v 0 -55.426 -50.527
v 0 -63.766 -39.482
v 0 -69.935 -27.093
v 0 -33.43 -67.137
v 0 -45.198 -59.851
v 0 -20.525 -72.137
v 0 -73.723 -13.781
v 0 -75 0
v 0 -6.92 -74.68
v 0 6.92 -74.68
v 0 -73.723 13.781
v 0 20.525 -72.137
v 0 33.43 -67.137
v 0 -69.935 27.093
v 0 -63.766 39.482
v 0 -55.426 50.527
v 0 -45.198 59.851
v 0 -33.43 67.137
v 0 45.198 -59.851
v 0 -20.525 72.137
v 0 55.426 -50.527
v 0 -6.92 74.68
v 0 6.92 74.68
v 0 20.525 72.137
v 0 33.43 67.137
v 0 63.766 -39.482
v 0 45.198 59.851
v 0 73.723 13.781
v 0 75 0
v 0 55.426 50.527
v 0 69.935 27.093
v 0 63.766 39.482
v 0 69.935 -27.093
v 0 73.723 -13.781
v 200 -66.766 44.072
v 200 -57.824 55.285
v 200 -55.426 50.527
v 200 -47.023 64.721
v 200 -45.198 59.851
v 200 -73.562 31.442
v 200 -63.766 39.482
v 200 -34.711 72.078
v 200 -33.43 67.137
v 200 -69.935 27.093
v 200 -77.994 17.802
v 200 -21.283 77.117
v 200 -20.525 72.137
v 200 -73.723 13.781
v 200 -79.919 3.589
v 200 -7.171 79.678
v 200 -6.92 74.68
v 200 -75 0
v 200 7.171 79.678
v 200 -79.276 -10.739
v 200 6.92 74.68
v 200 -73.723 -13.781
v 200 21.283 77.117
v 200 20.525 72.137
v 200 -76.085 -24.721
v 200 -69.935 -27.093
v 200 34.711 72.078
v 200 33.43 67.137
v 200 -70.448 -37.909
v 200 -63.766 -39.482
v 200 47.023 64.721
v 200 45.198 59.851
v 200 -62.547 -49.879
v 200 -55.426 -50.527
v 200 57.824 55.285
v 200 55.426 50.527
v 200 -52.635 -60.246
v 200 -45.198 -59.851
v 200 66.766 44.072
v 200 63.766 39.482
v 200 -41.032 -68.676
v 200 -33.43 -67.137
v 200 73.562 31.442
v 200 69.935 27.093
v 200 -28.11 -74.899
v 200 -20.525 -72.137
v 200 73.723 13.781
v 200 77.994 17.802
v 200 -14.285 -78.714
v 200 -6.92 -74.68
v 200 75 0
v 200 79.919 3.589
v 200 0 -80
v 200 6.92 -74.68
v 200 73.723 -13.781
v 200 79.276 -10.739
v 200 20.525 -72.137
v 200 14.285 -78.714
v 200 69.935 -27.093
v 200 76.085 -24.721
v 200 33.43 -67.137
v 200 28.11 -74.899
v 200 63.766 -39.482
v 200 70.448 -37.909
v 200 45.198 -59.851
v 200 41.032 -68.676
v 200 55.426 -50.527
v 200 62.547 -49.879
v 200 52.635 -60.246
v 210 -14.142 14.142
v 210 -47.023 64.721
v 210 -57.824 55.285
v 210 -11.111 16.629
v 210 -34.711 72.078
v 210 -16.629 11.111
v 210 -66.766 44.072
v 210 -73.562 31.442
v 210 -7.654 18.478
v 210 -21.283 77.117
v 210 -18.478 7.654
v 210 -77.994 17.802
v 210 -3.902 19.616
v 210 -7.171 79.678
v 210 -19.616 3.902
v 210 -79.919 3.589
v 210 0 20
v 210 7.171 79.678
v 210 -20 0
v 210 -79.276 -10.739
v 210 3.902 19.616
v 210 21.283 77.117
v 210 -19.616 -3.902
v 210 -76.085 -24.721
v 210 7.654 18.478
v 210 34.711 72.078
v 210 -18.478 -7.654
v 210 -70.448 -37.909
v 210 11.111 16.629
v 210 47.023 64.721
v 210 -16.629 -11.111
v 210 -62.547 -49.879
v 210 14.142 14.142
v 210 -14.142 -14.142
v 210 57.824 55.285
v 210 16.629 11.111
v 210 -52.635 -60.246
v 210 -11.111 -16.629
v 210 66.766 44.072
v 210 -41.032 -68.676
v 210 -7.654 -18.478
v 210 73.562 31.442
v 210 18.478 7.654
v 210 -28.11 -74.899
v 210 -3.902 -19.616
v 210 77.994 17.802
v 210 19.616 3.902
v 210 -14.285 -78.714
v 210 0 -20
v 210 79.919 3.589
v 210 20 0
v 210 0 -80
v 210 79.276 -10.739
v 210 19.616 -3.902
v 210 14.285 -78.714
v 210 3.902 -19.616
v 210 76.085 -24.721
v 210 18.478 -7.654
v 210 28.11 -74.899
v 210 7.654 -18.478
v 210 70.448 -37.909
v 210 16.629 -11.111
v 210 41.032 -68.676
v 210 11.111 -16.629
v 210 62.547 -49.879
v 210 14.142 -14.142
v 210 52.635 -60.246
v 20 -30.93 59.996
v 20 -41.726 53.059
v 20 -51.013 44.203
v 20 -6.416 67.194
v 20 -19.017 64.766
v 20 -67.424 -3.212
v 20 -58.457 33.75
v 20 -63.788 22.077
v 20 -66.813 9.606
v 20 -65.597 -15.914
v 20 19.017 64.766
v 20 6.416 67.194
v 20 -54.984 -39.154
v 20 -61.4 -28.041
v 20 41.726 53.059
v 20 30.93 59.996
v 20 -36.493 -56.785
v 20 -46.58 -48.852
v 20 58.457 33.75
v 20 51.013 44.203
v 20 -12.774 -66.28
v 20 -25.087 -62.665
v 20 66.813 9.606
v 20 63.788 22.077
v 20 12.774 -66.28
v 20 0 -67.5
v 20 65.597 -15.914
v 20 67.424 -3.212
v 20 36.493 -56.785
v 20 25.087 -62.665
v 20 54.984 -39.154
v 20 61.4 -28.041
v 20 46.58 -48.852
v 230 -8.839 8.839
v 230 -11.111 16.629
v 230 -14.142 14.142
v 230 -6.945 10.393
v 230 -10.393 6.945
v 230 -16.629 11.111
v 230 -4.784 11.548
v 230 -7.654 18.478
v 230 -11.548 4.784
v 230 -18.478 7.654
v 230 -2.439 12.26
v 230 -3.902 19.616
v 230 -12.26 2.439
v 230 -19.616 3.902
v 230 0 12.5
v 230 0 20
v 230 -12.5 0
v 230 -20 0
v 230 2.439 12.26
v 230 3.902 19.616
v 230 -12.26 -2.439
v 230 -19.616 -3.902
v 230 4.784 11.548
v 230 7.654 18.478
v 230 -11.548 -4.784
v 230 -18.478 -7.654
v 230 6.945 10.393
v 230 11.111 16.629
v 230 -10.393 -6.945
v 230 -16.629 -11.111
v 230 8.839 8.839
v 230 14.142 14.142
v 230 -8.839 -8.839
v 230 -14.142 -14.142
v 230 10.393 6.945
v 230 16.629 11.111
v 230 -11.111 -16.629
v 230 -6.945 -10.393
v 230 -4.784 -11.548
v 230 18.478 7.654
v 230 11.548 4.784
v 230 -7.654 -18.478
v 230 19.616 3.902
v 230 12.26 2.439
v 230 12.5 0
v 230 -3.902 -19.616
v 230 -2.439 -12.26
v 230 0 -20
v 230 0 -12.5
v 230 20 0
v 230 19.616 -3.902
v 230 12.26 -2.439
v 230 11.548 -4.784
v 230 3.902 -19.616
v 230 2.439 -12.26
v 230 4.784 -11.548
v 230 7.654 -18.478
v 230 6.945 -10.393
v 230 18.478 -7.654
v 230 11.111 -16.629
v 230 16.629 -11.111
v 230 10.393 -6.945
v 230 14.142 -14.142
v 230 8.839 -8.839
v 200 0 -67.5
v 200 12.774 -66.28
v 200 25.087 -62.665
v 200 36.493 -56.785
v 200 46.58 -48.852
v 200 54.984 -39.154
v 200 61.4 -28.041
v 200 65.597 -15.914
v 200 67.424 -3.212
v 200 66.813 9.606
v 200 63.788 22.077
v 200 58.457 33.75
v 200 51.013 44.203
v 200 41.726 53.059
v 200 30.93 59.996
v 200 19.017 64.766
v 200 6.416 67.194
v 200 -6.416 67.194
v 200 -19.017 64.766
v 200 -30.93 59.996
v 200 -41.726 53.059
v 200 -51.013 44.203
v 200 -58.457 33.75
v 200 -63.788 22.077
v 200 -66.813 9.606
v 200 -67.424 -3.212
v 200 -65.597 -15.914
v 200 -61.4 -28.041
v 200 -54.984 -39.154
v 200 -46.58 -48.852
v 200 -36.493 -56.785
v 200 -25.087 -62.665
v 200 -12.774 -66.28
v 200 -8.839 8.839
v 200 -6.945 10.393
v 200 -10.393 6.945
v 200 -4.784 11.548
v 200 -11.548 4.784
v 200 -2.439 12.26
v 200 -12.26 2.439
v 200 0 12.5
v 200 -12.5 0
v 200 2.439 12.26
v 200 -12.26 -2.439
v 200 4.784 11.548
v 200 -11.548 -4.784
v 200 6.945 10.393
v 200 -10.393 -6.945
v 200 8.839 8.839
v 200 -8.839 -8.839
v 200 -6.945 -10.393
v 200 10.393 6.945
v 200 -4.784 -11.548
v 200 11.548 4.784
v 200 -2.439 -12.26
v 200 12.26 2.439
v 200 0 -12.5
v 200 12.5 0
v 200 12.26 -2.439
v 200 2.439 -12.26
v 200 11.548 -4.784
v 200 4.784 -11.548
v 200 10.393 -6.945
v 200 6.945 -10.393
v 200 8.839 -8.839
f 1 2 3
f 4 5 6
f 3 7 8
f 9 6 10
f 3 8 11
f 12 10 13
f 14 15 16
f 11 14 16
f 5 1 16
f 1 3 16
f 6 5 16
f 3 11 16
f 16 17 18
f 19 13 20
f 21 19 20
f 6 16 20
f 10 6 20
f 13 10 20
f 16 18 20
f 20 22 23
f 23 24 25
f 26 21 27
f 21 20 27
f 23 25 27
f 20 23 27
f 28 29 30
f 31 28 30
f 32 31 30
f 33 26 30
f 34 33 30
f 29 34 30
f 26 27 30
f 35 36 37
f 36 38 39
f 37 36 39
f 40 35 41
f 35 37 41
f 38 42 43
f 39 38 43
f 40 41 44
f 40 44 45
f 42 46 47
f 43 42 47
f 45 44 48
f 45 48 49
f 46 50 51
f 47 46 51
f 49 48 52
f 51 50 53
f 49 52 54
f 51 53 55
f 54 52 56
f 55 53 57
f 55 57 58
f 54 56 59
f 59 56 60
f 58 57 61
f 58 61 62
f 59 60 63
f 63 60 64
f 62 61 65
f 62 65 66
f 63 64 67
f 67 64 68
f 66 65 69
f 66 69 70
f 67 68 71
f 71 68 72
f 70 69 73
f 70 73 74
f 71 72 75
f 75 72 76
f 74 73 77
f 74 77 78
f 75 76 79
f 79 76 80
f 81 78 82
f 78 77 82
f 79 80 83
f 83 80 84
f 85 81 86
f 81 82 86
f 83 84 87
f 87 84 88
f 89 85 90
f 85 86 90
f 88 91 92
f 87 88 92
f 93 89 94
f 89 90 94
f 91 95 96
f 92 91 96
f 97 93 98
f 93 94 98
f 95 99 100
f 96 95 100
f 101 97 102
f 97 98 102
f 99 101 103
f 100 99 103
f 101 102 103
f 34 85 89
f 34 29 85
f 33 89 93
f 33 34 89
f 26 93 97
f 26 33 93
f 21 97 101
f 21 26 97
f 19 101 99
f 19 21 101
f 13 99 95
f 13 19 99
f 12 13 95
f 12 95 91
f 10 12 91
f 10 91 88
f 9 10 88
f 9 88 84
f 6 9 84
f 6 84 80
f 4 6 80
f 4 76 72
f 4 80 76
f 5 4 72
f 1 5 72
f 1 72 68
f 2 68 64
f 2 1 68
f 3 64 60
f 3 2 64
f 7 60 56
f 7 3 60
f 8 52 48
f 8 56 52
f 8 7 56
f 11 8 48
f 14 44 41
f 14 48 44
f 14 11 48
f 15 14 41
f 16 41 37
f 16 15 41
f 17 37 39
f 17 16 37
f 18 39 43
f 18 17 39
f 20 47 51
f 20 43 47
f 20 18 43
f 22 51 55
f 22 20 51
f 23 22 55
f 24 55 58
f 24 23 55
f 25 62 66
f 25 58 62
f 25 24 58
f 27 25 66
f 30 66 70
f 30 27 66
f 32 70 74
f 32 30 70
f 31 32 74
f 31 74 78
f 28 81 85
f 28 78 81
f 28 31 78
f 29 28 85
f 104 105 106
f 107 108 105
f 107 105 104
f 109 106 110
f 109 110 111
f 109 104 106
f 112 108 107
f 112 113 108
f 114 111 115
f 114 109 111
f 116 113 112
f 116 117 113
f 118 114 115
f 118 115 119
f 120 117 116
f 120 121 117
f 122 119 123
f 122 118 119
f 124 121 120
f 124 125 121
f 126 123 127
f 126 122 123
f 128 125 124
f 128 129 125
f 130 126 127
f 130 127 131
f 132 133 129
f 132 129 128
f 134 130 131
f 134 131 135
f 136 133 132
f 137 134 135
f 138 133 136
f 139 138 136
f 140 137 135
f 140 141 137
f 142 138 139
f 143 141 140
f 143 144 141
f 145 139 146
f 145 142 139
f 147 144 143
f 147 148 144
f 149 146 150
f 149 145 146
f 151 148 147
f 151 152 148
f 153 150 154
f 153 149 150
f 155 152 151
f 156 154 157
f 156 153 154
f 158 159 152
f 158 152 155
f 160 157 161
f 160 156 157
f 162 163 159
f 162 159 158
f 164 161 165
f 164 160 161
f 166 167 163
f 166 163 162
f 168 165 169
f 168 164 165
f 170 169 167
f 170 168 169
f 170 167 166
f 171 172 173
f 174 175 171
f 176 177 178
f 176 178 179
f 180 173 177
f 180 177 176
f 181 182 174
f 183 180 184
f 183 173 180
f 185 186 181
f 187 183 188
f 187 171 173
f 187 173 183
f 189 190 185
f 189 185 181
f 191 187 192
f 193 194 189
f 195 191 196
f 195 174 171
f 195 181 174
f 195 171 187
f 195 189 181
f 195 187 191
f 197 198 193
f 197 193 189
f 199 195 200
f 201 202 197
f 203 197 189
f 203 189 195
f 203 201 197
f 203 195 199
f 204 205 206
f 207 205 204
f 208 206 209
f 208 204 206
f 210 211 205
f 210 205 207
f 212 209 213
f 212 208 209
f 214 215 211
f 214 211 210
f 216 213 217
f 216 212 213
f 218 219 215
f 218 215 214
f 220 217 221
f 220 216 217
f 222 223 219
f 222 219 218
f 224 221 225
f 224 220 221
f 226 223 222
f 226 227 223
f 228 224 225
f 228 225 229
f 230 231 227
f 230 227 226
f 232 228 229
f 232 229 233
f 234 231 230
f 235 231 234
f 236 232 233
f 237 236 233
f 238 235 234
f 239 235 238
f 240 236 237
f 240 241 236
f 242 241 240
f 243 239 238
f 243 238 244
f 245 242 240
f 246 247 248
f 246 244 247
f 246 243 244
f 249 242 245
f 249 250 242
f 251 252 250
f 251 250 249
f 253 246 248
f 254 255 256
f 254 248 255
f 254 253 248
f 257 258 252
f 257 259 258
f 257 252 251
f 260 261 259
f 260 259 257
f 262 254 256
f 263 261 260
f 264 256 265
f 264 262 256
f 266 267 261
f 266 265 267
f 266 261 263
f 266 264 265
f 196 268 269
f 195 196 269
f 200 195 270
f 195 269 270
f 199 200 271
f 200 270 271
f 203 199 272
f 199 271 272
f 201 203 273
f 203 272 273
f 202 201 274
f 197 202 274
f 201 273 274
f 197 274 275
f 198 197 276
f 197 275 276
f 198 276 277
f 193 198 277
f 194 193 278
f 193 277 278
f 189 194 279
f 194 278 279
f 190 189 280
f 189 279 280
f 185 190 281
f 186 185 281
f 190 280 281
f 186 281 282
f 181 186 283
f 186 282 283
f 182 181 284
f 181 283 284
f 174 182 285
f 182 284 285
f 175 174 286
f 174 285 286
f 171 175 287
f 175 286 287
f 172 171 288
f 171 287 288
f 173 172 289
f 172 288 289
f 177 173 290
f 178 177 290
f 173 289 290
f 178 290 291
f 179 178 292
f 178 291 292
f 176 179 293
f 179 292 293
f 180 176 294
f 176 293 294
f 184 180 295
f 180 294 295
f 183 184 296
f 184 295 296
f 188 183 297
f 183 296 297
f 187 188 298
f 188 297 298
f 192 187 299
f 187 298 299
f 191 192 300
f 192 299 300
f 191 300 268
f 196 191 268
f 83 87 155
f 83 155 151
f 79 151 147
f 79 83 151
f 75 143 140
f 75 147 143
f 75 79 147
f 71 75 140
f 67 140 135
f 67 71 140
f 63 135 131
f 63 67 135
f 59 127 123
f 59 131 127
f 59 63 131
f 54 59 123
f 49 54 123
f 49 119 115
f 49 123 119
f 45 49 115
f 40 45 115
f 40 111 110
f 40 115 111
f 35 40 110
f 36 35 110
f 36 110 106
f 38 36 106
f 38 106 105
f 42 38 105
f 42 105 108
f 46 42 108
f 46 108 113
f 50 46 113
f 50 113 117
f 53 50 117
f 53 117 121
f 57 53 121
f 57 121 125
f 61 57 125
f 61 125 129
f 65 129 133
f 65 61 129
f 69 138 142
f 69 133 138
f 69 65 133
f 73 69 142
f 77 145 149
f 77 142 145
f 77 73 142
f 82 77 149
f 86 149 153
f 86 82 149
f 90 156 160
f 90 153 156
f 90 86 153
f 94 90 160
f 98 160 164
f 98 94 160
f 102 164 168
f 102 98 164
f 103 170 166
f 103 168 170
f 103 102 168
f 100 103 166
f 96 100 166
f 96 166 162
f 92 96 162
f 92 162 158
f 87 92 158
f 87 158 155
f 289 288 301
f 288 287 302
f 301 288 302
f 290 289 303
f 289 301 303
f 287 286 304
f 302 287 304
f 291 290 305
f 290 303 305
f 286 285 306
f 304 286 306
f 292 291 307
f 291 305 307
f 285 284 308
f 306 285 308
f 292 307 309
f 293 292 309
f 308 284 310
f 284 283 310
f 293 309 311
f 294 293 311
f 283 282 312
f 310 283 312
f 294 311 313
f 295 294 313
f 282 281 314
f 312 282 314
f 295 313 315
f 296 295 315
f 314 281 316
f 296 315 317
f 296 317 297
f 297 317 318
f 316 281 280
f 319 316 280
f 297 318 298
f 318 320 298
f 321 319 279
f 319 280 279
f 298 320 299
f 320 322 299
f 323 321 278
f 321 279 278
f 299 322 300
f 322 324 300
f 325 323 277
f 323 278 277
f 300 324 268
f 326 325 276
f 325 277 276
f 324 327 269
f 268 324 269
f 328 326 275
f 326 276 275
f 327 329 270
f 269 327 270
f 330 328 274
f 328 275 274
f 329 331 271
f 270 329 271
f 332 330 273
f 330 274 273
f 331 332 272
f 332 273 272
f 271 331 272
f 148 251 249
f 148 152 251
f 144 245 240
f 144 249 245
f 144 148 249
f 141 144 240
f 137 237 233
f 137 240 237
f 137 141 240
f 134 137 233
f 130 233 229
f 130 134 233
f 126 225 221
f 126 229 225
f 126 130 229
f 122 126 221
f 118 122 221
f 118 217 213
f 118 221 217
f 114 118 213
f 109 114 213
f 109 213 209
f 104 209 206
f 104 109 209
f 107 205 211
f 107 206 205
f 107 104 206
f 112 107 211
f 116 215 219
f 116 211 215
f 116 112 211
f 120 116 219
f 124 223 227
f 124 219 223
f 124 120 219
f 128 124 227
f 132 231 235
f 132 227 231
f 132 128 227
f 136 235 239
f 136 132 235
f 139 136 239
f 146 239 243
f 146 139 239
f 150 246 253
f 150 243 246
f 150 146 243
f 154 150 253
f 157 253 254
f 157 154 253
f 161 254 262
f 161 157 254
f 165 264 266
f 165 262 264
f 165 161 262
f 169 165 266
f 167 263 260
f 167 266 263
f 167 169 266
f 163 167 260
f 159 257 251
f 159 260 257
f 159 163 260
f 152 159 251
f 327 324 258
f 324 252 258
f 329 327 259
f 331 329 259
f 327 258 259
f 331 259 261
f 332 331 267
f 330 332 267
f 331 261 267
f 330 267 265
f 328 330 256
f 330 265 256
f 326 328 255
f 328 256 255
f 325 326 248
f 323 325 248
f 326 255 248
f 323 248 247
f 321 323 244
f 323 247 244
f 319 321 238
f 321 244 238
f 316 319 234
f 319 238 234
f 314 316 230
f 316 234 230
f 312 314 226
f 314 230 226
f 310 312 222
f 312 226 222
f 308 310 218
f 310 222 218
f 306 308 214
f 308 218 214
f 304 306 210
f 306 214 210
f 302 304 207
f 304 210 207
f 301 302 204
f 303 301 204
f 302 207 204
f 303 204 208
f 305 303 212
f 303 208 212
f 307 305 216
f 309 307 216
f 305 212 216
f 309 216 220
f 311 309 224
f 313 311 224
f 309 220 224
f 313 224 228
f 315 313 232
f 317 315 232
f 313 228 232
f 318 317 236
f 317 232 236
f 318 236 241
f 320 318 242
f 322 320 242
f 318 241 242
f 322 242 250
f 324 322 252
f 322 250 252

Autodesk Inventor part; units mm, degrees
ref_plane "YZ Plane" through (0, 0, 0) normal (1, 0, 0) x (0, 1, 0)
ref_plane "XZ Plane" through (0, 0, 0) normal (0, 1, 0) x (-1, 0, 0)
ref_plane "XY Plane" through (0, 0, 0) normal (0, 0, 1) x (1, 0, 0)
sketch "Sketch1" plane through (0, 0, 0) normal (1, 0, 0) x (0, 1, 0)
  circle A0 centre (0, 0) radius 75
  dimension "d0" = 150
extrude "Extrusion1" add sketch "Sketch1" along normal blind 200
sketch "Sketch2" plane through (200, 0, 0) normal (1, 0, 0) x (0, 0, -1)
  circle A0 centre (0, 0) radius 67.5
  dimension "d3" = 135
extrude "Extrusion2" cut sketch "Sketch2" against normal blind 180
sketch "Sketch3" plane through (200, 0, 0) normal (1, 0, 0) x (0, 0, -1)
  circle A0 centre (0, 0) radius 67.5 projected
  circle A1 centre (0, 0) radius 80
  dimension "d6" = 160
extrude "Extrusion3" add sketch "Sketch3" along normal blind 10 contours A0 | A1
sketch "Sketch4" plane through (210, 0, 0) normal (1, 0, 0) x (0, 0, -1)
  circle A0 centre (0, 0) radius 20
  dimension "d9" = 40
extrude "Extrusion4" add sketch "Sketch4" along normal blind 20
sketch "Sketch5" plane through (230, 0, 0) normal (1, 0, 0) x (0, 0, -1)
  circle A0 centre (0, 0) radius 12.5
  dimension "d12" = 25
extrude "Extrusion5" cut sketch "Sketch5" against normal blind 40
equation "\"BendRadius\" = Thickness"
equation "\"BendReliefWidth\" = Thickness"
equation "\"BendReliefDepth\" = 0.5 * Thickness"
equation "\"CornerReliefSize\" = 4 * Thickness"
equation "\"MinimumRemnant\" = 2 * Thickness"
equation "\"TransitionRadius\" = BendRadius"
equation "\"JacobiRadiusSize\" = BendRadius"
equation "\"GapSize\" = Thickness"
equation "\"Thickness\" = 3.048"
properties part number "Container1"
